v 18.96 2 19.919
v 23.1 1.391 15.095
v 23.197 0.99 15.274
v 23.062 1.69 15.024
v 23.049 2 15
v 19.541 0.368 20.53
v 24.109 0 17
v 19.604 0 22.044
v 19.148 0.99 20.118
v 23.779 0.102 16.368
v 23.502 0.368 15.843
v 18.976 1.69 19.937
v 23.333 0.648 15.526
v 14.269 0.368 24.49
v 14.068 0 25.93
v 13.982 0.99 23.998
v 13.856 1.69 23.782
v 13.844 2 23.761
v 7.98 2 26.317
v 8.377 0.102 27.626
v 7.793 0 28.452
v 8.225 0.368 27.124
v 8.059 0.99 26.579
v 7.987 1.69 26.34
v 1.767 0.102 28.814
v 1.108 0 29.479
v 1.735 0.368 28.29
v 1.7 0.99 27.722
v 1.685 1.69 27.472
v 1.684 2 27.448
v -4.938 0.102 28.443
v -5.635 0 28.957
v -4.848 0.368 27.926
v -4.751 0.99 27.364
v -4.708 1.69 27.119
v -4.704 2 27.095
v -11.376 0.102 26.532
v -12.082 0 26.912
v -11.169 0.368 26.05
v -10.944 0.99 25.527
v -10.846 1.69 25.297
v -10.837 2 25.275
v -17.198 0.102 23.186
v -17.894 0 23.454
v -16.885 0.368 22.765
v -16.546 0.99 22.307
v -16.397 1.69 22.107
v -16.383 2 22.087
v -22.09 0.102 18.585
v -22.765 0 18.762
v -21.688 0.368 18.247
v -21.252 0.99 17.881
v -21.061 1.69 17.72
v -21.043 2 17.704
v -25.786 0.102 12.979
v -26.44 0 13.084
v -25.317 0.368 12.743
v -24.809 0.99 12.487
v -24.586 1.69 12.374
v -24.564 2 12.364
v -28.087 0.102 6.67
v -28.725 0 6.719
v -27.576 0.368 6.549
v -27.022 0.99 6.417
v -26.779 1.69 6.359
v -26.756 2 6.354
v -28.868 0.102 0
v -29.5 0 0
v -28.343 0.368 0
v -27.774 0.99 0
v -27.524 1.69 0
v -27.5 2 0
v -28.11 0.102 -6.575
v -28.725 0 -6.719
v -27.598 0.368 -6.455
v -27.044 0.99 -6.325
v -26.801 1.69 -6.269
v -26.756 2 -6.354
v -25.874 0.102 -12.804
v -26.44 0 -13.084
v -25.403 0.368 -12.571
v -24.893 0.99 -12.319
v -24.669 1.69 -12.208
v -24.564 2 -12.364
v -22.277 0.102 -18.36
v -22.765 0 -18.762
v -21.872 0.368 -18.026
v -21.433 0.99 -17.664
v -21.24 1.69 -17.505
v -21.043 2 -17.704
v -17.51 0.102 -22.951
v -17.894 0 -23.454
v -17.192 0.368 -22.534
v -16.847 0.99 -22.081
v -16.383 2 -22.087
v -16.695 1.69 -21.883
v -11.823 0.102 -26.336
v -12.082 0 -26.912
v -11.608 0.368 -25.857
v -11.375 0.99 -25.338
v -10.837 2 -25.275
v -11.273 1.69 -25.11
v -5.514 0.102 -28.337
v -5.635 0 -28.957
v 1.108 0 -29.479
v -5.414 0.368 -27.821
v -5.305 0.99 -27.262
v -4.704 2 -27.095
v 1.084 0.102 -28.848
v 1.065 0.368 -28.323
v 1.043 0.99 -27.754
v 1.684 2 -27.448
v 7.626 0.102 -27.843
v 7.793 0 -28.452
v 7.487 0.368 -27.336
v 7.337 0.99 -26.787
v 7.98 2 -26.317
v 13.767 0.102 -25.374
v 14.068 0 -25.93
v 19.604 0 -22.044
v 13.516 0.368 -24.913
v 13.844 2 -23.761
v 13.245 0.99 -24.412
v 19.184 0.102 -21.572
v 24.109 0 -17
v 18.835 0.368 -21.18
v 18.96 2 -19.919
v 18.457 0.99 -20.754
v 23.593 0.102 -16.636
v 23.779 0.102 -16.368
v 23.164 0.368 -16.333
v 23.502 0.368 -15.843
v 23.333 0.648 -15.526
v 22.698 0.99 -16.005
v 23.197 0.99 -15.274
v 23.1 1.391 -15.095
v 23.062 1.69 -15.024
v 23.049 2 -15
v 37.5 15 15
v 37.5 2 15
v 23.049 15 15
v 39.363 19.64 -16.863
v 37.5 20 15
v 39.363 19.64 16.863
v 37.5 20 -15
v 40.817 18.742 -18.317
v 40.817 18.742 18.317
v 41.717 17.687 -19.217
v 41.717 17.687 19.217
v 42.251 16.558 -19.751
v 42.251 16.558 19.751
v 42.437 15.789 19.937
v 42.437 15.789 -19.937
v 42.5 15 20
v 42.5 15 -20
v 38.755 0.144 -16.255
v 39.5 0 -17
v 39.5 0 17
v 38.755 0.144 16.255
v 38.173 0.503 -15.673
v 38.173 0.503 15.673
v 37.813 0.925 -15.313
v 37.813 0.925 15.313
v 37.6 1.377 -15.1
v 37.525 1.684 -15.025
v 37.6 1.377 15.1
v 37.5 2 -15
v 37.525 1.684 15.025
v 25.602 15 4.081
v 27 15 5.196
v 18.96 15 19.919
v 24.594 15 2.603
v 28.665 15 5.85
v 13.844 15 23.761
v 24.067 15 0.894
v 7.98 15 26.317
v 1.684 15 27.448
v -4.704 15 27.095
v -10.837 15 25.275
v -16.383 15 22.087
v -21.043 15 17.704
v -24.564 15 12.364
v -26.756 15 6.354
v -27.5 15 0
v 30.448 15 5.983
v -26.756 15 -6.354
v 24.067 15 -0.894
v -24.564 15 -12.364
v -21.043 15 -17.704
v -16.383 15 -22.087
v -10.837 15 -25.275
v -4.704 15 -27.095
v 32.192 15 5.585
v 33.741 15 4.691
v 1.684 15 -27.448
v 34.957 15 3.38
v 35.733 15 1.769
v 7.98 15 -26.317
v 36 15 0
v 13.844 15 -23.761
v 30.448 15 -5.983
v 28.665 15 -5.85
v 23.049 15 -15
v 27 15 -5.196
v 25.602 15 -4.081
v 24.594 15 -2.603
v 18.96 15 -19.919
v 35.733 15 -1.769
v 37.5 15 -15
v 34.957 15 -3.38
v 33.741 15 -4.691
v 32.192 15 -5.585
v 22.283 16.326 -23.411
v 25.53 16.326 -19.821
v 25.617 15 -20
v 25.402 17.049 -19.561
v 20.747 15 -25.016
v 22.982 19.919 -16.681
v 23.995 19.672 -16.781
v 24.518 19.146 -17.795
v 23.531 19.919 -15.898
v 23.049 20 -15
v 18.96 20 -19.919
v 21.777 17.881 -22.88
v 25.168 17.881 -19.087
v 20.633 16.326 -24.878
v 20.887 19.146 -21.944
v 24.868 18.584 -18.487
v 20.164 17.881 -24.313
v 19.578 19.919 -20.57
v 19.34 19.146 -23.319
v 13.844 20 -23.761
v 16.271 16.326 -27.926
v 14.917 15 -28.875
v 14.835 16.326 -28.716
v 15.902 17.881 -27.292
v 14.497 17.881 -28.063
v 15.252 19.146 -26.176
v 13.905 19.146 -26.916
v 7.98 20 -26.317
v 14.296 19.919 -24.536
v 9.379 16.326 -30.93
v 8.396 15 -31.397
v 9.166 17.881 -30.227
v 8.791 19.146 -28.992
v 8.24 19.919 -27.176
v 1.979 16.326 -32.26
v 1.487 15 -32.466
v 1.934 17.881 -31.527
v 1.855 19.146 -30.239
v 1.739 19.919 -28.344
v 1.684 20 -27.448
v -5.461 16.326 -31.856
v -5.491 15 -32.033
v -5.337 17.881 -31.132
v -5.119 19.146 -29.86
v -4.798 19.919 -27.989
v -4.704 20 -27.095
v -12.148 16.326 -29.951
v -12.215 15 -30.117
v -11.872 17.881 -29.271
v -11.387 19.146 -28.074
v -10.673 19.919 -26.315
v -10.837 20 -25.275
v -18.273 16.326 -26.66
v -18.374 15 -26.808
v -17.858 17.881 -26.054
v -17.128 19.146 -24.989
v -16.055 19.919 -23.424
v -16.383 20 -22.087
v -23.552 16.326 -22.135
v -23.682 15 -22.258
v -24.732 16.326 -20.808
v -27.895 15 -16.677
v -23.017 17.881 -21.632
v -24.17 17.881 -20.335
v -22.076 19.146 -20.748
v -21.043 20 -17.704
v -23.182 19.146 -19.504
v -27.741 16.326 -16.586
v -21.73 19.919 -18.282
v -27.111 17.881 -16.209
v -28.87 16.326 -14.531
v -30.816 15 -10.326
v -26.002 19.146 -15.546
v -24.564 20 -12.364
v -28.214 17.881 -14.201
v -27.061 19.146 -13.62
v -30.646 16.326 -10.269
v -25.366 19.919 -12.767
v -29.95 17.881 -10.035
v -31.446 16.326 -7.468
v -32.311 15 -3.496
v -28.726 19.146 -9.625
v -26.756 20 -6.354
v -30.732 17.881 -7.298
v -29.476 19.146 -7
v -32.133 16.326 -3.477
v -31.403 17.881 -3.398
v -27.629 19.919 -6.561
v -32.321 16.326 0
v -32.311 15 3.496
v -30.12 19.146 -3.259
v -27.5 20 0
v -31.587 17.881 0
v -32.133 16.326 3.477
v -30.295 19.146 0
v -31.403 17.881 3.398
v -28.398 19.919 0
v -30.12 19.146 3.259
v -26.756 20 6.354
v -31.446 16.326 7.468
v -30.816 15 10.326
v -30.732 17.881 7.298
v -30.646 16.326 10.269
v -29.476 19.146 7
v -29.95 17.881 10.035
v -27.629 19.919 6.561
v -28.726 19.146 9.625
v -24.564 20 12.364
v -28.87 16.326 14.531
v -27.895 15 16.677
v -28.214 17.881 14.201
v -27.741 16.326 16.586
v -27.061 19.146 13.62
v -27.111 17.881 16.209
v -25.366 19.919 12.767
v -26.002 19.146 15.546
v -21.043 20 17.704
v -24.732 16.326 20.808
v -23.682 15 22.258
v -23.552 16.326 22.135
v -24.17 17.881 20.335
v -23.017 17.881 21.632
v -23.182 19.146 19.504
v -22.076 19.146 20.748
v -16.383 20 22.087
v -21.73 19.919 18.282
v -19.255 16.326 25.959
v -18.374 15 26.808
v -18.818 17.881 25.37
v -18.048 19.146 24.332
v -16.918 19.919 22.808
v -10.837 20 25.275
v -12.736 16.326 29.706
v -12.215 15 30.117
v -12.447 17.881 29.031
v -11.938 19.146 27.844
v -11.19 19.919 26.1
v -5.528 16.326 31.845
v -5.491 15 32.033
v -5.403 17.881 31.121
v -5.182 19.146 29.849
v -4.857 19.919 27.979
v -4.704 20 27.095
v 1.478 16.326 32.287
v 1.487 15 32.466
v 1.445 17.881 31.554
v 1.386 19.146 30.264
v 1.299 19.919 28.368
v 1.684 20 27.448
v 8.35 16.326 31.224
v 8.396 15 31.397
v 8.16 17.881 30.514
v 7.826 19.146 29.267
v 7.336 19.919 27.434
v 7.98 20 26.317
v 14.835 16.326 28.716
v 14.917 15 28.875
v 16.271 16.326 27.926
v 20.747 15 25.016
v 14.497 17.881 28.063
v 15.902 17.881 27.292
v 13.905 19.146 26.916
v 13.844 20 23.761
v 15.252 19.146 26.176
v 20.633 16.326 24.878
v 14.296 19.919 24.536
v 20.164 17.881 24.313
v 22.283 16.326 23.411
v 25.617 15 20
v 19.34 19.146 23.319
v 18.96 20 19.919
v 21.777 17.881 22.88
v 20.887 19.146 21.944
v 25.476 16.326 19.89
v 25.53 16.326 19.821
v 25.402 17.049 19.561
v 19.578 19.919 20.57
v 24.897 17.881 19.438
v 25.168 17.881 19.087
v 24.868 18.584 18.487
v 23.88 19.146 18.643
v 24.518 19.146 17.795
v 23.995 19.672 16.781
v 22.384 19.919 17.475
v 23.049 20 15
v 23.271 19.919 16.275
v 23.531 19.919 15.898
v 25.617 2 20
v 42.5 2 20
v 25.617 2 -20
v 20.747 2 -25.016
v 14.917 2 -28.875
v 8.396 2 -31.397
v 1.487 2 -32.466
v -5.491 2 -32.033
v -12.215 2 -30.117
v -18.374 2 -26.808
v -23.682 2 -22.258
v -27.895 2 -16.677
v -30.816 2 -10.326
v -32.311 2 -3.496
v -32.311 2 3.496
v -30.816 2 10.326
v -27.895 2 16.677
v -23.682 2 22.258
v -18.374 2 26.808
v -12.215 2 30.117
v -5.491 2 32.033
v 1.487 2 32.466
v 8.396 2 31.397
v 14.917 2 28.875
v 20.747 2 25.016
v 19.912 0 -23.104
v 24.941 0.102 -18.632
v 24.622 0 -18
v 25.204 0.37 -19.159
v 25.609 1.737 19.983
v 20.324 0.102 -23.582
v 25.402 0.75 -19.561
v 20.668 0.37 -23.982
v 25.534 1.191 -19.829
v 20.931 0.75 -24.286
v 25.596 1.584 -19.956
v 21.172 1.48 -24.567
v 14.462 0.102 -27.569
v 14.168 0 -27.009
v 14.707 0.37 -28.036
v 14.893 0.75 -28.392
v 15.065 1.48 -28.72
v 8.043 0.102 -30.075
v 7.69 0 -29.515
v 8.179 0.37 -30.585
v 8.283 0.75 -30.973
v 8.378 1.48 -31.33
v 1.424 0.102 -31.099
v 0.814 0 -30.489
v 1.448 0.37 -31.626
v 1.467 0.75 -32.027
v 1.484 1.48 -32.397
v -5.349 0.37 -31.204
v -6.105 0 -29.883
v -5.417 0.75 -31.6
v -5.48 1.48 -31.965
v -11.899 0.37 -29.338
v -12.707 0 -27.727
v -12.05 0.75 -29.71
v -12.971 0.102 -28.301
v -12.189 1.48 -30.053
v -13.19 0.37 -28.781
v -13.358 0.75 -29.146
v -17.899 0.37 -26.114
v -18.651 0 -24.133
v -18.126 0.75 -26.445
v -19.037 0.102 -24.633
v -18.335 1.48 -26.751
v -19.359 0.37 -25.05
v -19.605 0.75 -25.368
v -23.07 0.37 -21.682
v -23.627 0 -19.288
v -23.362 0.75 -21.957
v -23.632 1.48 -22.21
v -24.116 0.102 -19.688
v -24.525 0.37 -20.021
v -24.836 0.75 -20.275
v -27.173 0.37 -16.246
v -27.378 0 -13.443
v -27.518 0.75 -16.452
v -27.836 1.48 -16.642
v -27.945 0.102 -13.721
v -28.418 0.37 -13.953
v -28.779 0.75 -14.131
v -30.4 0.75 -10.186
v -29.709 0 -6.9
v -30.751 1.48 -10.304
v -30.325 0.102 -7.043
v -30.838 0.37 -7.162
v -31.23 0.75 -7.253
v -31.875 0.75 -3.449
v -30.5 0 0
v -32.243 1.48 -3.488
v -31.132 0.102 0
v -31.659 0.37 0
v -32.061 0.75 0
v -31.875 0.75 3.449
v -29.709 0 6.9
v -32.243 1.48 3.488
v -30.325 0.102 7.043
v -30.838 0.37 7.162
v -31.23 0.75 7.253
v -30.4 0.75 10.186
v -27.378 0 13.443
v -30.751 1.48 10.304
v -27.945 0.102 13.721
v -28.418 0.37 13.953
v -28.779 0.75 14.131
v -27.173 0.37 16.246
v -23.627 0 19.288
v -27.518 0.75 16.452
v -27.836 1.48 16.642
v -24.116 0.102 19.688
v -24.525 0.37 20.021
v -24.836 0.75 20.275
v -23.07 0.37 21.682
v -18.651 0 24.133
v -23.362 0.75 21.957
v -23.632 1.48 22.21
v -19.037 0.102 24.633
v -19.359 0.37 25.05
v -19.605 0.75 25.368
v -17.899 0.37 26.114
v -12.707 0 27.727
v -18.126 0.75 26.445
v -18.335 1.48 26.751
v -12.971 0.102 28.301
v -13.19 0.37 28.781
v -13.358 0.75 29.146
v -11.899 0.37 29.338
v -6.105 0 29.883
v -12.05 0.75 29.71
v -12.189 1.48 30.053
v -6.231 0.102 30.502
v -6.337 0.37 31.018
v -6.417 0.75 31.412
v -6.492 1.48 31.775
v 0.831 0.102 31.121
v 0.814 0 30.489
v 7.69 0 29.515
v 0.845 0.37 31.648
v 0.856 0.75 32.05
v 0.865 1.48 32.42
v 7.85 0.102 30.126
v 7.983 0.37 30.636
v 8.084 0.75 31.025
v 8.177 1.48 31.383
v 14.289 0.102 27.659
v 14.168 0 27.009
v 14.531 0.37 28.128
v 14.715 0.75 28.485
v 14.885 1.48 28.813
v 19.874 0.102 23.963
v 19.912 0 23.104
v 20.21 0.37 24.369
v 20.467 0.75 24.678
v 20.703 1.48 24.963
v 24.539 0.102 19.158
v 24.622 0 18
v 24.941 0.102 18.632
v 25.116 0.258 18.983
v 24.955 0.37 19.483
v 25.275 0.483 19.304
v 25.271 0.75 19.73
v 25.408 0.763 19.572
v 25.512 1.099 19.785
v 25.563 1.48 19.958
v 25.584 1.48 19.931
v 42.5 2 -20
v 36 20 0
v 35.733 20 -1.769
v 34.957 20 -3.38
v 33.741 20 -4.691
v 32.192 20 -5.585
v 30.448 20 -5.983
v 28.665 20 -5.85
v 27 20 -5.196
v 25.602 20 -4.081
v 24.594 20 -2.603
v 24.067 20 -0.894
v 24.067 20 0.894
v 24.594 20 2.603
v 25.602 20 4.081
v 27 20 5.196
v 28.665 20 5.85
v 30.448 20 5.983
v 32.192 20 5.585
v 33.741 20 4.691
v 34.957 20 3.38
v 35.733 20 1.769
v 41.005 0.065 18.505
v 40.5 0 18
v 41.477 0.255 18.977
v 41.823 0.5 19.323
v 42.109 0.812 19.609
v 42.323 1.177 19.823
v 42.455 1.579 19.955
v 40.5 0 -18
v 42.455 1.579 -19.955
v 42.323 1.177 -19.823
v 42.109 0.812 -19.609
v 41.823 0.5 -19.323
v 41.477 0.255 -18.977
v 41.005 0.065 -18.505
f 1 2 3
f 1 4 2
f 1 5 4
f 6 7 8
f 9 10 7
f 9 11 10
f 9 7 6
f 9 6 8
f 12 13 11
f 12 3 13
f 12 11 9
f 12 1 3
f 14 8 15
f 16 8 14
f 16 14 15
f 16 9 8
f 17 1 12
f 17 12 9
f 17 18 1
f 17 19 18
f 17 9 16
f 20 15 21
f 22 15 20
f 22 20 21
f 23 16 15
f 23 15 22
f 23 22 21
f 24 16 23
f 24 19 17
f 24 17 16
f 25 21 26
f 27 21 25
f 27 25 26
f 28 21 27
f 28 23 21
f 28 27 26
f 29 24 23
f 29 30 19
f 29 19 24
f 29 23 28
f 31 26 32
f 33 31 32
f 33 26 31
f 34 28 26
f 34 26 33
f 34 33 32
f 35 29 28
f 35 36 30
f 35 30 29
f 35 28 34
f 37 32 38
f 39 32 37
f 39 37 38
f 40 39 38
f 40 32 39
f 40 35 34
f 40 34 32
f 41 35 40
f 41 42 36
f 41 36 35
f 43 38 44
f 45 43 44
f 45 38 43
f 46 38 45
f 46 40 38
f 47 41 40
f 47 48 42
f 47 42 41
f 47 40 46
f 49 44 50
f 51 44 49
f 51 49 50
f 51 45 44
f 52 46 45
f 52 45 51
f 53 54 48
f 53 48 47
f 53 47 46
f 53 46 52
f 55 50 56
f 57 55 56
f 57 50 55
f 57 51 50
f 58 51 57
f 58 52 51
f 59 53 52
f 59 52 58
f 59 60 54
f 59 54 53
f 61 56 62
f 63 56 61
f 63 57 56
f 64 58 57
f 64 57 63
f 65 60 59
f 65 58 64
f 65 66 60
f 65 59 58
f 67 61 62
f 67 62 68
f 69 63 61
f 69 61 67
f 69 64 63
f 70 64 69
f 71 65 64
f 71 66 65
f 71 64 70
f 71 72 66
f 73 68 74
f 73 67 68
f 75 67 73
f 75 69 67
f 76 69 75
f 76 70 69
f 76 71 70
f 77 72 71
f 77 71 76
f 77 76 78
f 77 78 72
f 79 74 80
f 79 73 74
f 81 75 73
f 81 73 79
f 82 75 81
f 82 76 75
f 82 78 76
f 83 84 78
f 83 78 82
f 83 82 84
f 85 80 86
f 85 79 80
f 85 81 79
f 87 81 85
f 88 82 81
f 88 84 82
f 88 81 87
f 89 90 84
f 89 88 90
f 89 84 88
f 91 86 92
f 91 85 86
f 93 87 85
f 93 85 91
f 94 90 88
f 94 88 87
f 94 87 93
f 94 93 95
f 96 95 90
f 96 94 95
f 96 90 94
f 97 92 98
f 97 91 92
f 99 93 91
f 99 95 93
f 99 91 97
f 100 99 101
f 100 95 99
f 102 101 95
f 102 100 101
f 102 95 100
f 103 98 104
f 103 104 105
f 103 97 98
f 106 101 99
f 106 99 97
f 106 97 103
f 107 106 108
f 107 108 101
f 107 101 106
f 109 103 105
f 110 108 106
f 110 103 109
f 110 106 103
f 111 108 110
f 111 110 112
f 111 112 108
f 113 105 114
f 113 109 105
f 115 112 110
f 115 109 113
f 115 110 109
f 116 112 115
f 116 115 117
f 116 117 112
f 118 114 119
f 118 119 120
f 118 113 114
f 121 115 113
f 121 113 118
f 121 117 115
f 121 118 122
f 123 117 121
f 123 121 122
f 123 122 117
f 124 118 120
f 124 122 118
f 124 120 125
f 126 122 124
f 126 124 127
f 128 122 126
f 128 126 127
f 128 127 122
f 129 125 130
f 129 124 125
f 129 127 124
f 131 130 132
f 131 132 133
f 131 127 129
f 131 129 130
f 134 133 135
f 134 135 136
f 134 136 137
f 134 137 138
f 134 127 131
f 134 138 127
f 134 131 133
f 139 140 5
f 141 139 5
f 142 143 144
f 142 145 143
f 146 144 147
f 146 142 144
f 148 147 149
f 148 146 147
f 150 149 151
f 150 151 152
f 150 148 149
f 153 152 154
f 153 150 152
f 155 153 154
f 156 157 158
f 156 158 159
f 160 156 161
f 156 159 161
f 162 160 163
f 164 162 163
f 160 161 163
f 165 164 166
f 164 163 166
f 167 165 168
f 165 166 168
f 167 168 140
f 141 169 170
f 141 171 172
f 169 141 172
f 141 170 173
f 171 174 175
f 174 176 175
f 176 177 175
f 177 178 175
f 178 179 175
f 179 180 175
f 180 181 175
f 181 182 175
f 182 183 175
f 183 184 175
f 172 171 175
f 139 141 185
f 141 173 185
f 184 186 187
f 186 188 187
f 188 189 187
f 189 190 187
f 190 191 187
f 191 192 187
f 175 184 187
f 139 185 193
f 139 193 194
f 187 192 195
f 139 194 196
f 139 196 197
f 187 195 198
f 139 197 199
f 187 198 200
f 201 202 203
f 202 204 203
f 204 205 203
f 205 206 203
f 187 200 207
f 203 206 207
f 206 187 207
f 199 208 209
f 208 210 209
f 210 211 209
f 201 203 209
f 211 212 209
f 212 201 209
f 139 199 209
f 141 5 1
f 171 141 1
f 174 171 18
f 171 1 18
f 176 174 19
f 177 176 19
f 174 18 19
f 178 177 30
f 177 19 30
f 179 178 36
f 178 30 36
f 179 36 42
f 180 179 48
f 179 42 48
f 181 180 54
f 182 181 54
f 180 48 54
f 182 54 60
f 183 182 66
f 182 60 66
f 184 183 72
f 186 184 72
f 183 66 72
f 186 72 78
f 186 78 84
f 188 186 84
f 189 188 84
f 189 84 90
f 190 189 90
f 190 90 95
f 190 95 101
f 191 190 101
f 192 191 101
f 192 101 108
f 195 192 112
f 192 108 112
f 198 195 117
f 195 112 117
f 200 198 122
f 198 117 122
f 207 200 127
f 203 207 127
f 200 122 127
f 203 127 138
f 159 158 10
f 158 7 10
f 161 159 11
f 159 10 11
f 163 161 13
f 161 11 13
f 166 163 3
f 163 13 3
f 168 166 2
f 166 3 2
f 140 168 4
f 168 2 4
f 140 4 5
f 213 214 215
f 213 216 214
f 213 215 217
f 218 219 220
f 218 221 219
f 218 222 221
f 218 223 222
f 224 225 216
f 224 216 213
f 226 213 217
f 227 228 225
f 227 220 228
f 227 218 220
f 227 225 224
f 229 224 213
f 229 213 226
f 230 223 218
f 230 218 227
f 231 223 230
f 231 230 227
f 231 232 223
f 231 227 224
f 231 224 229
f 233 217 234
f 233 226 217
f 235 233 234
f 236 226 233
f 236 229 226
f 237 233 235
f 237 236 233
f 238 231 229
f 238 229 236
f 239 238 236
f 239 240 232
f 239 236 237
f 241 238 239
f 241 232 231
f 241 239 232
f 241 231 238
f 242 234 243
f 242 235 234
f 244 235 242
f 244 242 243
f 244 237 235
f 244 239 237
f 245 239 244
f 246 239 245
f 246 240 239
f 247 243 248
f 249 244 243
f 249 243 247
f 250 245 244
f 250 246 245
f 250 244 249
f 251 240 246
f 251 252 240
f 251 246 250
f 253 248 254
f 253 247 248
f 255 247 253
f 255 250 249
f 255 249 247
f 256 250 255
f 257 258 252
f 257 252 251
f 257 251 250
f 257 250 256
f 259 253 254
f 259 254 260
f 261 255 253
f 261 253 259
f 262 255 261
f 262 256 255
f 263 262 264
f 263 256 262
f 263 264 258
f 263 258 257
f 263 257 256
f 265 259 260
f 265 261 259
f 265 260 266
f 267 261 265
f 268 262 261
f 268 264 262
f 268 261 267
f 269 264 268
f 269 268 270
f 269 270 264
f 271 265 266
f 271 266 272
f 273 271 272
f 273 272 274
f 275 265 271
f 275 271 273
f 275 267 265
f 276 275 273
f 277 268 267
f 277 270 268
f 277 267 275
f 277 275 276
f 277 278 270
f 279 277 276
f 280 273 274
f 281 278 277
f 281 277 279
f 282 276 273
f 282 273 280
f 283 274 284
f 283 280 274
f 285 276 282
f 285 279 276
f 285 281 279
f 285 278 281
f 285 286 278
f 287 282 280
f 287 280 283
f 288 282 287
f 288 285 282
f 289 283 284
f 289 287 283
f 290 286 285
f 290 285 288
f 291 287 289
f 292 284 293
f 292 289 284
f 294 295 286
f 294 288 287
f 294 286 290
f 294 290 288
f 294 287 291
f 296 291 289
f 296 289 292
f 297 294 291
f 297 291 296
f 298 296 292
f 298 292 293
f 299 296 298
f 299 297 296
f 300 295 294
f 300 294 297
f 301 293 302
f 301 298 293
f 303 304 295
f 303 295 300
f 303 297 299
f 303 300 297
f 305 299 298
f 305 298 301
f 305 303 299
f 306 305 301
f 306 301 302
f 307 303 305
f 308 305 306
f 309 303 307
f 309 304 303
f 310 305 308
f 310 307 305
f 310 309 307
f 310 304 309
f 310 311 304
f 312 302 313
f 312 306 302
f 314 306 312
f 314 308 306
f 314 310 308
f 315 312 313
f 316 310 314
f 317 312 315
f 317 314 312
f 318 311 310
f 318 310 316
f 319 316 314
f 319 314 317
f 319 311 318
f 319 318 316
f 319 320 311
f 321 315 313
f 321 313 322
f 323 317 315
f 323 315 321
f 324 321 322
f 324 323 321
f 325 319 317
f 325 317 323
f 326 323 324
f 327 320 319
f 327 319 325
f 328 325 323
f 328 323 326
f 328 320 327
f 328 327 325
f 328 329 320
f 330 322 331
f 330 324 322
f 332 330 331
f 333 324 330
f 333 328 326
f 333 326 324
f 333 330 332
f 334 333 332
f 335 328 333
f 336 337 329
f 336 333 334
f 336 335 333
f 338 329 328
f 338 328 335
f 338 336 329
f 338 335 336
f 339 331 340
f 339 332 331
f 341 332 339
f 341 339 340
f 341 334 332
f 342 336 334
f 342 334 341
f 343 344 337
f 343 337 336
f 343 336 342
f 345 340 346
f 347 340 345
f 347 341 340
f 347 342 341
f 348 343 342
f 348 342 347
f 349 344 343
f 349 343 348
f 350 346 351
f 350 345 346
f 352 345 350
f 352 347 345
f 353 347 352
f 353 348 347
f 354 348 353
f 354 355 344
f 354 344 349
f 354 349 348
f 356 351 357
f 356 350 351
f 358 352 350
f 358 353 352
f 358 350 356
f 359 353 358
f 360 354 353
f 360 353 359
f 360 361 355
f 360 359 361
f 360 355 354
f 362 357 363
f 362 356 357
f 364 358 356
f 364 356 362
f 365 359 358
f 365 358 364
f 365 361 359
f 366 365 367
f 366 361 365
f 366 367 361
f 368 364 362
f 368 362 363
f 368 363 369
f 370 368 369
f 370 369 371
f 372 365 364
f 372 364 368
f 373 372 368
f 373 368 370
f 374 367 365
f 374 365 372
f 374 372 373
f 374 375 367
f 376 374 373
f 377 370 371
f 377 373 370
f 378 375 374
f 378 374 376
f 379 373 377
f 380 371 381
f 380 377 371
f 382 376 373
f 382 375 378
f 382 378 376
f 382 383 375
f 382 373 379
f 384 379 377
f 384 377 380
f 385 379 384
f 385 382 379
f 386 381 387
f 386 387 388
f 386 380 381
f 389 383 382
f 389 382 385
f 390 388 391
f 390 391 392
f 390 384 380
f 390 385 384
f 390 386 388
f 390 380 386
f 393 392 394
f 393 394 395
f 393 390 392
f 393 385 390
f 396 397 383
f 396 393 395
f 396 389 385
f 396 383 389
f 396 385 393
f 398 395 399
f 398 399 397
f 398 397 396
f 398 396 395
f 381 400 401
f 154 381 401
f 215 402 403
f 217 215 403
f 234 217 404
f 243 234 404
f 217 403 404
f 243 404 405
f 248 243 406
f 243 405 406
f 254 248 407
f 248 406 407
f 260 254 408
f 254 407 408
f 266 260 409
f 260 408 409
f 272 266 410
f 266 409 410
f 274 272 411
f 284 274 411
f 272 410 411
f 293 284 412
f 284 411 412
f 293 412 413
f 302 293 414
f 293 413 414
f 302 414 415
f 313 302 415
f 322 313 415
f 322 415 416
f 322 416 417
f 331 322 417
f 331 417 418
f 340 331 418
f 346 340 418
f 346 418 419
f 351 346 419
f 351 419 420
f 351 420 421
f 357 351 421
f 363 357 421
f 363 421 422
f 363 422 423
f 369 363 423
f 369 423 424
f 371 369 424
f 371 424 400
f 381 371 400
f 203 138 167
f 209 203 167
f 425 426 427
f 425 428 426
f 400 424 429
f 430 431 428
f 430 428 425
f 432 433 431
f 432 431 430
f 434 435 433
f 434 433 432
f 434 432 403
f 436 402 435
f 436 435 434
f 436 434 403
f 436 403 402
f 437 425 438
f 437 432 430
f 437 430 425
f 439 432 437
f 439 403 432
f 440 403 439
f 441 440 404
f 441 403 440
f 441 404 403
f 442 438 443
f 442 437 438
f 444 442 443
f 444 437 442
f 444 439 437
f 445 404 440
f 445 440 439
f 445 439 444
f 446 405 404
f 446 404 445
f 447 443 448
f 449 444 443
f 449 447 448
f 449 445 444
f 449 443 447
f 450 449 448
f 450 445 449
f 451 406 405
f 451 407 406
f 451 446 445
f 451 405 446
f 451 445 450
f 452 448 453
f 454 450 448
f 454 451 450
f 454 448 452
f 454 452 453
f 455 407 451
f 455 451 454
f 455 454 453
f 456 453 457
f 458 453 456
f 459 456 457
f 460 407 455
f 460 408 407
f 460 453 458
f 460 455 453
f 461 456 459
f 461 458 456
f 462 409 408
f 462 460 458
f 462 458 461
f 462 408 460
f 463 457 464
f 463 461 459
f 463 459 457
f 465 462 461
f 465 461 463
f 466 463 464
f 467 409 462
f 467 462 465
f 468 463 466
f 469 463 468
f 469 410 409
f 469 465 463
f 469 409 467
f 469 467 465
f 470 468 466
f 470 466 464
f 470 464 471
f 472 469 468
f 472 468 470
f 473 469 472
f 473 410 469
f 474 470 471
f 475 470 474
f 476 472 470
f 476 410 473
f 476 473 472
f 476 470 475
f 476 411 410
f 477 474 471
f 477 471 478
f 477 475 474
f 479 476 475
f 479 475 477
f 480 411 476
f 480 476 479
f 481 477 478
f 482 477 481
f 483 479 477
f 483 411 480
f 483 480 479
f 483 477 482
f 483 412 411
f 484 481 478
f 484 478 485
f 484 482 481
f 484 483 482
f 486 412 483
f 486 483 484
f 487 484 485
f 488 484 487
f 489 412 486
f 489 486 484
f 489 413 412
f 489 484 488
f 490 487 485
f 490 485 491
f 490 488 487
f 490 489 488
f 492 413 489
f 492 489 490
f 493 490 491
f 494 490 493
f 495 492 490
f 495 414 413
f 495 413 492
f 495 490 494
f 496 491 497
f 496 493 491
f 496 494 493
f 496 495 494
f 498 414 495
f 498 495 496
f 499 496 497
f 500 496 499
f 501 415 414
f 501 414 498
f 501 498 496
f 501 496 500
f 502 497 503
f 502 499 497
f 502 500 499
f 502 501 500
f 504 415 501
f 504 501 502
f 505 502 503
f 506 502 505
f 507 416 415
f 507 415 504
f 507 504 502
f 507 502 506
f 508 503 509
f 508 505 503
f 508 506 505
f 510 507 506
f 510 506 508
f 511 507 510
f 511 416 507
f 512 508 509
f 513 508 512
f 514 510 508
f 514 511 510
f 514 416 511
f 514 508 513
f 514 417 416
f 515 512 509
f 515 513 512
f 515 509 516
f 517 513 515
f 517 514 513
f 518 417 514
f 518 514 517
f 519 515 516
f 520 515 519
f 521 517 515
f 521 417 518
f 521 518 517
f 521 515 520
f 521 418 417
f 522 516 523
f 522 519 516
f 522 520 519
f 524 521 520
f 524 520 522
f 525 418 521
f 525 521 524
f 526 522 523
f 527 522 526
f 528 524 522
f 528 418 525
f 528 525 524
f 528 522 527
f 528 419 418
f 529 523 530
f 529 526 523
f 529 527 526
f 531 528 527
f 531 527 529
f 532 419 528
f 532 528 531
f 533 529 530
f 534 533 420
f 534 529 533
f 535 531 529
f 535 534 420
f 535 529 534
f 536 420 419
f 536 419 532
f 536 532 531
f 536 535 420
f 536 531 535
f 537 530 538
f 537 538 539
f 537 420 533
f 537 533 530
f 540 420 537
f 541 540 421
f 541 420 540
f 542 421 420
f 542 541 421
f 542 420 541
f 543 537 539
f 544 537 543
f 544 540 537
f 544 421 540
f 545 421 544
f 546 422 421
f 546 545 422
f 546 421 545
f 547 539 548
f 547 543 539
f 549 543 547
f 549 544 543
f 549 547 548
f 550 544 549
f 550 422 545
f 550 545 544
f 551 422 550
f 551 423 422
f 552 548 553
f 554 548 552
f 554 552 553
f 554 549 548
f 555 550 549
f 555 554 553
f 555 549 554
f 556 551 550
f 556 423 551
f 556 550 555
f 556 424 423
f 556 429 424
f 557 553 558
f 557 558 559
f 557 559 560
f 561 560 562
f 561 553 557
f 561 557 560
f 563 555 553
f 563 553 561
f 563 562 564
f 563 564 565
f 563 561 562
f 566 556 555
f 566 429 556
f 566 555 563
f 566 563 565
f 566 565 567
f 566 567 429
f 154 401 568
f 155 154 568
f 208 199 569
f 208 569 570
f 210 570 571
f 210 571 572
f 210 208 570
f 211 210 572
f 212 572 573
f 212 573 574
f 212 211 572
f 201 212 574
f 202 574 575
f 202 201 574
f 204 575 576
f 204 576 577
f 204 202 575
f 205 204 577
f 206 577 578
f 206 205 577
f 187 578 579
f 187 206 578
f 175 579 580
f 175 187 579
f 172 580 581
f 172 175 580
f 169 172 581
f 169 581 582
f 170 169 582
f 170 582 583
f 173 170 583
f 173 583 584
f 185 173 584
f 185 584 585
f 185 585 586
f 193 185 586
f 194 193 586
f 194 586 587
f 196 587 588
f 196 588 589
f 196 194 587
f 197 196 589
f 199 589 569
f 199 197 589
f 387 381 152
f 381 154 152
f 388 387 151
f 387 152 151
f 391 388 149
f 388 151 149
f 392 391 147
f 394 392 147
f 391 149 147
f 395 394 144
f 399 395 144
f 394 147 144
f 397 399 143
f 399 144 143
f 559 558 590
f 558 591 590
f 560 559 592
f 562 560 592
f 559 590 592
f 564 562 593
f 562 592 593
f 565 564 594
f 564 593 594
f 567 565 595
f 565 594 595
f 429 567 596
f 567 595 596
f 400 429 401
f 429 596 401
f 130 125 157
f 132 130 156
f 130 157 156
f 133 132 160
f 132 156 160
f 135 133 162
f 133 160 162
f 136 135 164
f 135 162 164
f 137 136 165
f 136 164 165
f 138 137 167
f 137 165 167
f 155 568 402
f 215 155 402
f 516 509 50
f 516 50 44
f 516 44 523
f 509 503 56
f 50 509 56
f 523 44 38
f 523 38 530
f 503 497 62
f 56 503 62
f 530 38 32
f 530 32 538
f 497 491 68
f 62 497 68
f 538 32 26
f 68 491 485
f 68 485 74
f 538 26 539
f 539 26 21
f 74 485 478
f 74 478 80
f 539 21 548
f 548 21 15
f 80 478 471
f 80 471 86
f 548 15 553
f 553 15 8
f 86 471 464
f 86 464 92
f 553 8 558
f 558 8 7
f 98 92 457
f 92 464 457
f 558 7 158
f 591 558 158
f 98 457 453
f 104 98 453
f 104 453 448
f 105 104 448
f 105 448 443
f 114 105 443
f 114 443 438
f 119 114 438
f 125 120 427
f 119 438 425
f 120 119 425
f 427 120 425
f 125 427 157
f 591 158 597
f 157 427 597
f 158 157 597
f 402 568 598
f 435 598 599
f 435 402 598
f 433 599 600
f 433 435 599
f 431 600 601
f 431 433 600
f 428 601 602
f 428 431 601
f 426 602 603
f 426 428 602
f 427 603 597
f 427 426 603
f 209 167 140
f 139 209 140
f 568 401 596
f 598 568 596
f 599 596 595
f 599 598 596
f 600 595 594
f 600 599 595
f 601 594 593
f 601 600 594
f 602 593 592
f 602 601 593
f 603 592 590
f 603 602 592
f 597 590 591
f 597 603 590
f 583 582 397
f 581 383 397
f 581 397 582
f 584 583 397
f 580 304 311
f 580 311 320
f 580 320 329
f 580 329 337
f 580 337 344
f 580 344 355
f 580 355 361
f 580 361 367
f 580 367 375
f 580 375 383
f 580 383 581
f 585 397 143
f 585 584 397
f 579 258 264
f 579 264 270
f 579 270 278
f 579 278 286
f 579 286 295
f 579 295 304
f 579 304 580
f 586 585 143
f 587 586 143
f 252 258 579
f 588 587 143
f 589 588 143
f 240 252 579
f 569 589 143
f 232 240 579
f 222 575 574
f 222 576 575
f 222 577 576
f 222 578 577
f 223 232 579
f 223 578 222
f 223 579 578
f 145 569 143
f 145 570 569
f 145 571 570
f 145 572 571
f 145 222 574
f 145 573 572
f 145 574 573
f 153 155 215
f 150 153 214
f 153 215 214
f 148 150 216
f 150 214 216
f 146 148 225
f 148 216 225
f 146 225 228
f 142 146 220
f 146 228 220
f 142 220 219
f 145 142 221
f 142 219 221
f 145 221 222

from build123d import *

# Parameters (mm, degrees)
BOSS_EXTRU_1_DEPTH = 15
ESQUISSE2_R        = 6
BOSS_EXTRU_2_DEPTH = 5
CONG_1_R           = 5
CONG_2_R           = 2


with BuildPart() as part:
    # Esquisse1 → Boss.-Extru.1 (new body)
    with BuildSketch(Plane(origin=(0, 0, 0), x_dir=(1, 0, 0), z_dir=(0, 1, 0))):
        with BuildLine():
            ThreePointArc((28.831406487, 15), (27.338937497, 17.573630715), (25.617376915, 20))
            ThreePointArc((25.617376915, 20), (-32.5, 0), (25.617376915, -20))
            ThreePointArc((25.617376915, -20), (27.338937497, -17.573630715), (28.831406487, -15))
            Line((28.831406487, -15), (23.048861143, -15))
            ThreePointArc((23.048861143, -15), (-27.5, 0), (23.048861143, 15))
            Line((23.048861143, 15), (28.831406487, 15))
        make_face()
        with BuildLine():
            Line((42.5, 20), (25.617376915, 20))
            ThreePointArc((25.617376915, 20), (27.338937497, 17.573630715), (28.831406487, 15))
            Line((28.831406487, 15), (37.5, 15))
            Line((37.5, 15), (37.5, -15))
            Line((37.5, -15), (28.831406487, -15))
            ThreePointArc((28.831406487, -15), (27.338937497, -17.573630715), (25.617376915, -20))
            Line((25.617376915, -20), (42.5, -20))
            Line((42.5, -20), (42.5, 20))
        make_face()
    extrude(amount=BOSS_EXTRU_1_DEPTH)

    # Esquisse2 → Boss.-Extru.2 (add)
    with BuildSketch(Plane(origin=(0, 15, 0), x_dir=(1, 0, 0), z_dir=(0, 1, 0))):
        with BuildLine():
            Line((42.5, 20), (25.617376915, 20))
            ThreePointArc((25.617376915, 20), (-32.5, 0), (25.617376915, -20))
            Line((25.617376915, -20), (42.5, -20))
            Line((42.5, -20), (42.5, 20))
        make_face()
        with Locations((30, 0)):
            Circle(ESQUISSE2_R, mode=Mode.SUBTRACT)
    extrude(amount=BOSS_EXTRU_2_DEPTH)

    # Congé1
    cong_1_edges = [part.edges().sort_by_distance(p)[0] for p in [
        (42.5, 20, 0),
        (34.058688457, 20, -20),
        (-32.5, 20, 0),
        (34.058688457, 20, 20),
    ]]
    fillet(cong_1_edges, radius=CONG_1_R)

    # Congé2
    cong_2_edges = [part.edges().sort_by_distance(p)[0] for p in [
        (-27.5, 0, 0),
        (30.274430572, 0, 15),
        (37.5, 0, 0),
        (30.274430572, 0, -15),
        (42.5, 0, 0),
        (34.058688457, 0, 20),
        (-32.5, 0, 0),
        (34.058688457, 0, -20),
    ]]
    fillet(cong_2_edges, radius=CONG_2_R)


solid = part.part
